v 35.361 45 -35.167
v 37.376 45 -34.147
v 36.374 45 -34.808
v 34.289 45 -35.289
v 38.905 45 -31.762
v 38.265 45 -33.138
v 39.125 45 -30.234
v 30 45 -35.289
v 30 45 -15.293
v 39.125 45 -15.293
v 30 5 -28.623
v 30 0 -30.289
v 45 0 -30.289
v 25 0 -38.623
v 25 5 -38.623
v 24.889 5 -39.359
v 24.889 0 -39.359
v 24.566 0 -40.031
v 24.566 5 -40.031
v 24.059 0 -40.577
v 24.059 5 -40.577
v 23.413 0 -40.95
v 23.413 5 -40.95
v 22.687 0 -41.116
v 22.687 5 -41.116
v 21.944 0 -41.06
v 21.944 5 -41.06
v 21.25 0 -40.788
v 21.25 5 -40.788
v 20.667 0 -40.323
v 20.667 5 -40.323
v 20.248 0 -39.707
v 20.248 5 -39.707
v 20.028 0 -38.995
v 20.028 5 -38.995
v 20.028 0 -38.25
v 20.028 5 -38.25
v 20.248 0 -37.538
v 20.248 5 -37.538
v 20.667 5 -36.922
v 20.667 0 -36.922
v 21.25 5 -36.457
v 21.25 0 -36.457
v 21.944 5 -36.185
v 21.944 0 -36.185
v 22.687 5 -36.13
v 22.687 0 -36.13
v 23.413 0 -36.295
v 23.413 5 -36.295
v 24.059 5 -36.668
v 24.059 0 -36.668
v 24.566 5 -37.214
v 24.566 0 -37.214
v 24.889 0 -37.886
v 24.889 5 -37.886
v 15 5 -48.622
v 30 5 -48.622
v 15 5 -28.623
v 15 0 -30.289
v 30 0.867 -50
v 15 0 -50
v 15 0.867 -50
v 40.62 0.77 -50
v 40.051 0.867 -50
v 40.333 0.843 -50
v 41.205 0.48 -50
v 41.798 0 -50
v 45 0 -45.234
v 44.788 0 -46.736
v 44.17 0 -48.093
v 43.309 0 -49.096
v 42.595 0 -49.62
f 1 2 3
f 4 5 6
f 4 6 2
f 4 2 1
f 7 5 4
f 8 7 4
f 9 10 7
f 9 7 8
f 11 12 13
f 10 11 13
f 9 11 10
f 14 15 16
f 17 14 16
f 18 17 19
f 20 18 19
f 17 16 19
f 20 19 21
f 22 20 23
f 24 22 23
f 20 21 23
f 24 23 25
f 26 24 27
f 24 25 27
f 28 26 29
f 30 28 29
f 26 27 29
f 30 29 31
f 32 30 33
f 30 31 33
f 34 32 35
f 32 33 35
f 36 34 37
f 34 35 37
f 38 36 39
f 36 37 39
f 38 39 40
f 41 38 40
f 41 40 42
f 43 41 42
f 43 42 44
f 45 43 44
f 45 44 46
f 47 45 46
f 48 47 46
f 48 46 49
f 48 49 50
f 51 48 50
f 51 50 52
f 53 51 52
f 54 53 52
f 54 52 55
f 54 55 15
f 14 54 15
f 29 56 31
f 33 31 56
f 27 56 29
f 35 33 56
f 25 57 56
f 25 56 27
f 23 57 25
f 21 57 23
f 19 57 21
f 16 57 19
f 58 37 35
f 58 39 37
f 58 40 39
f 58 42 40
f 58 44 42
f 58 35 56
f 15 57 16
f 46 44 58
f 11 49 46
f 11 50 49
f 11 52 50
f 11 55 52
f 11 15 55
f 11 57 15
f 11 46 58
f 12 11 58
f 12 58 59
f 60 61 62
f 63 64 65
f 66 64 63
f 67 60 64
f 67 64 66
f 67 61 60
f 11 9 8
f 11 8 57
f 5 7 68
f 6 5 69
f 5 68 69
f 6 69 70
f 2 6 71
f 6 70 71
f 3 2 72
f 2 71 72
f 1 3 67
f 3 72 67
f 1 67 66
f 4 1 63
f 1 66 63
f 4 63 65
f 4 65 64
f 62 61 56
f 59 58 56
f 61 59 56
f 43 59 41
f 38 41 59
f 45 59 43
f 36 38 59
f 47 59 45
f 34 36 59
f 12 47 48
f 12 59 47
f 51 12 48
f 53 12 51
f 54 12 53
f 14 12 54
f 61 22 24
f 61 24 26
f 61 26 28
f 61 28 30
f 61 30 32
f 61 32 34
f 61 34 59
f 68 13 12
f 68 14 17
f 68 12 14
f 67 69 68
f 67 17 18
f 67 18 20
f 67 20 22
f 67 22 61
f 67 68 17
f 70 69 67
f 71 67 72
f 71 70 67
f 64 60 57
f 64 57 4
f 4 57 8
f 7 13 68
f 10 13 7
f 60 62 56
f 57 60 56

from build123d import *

# Parameters (mm, degrees)
EXTRUDE_6_DEPTH     = 50
CUT_EXTRUDE_5_DEPTH = 63
EXTRUDE_7_DEPTH     = 15
FILLET_2_R          = 5
SKETCH_8_R          = 2.5
CUT_EXTRUDE_6_DEPTH = 10


with BuildPart() as part:
    # Эскиз2 → Бобышка-Вытянуть6 (new body)
    with BuildSketch(Plane.XY):
        Polygon((39.125, 45), (30, 45), (30, 0), (45, 0), align=None)
    extrude(amount=-EXTRUDE_6_DEPTH)

    # Эскиз4 → Вырез-Вытянуть5 (cut)
    with BuildSketch(Plane(origin=(0, 0, 0), x_dir=(0, 0, -1), z_dir=(1, 0, 0))):
        Polygon((50.288969981, 0), (35.288969981, 45), (50, 45), align=None)
        Polygon((0, 45), (0, 0), (30.288969981, 0), (15.293288519, 45), align=None)
    extrude(amount=CUT_EXTRUDE_5_DEPTH, mode=Mode.SUBTRACT)

    # Эскиз7 → Бобышка-Вытянуть7 (add)
    with BuildSketch(Plane.ZY.offset(-30)):
        Polygon((-50, 0), (-50, 0.866909943), (-48.622303314, 5), (-28.622783152, 5), (-30.288969981, 0), align=None)
    extrude(amount=EXTRUDE_7_DEPTH)

    # Скругление2
    fillet_2_edges = [part.edges().sort_by_distance(p)[0] for p in [
        (42.005910045, 22.933454971, -42.64448499),
    ]]
    fillet(fillet_2_edges, radius=FILLET_2_R)

    # Эскиз8 → Вырез-Вытянуть6 (cut)
    with BuildSketch(Plane(origin=(0, 5, 0), x_dir=(1, 0, 0), z_dir=(0, 1, 0))):
        with Locations((22.5, 38.622543233)):
            Circle(SKETCH_8_R)
    extrude(amount=-CUT_EXTRUDE_6_DEPTH, mode=Mode.SUBTRACT)


solid = part.part
